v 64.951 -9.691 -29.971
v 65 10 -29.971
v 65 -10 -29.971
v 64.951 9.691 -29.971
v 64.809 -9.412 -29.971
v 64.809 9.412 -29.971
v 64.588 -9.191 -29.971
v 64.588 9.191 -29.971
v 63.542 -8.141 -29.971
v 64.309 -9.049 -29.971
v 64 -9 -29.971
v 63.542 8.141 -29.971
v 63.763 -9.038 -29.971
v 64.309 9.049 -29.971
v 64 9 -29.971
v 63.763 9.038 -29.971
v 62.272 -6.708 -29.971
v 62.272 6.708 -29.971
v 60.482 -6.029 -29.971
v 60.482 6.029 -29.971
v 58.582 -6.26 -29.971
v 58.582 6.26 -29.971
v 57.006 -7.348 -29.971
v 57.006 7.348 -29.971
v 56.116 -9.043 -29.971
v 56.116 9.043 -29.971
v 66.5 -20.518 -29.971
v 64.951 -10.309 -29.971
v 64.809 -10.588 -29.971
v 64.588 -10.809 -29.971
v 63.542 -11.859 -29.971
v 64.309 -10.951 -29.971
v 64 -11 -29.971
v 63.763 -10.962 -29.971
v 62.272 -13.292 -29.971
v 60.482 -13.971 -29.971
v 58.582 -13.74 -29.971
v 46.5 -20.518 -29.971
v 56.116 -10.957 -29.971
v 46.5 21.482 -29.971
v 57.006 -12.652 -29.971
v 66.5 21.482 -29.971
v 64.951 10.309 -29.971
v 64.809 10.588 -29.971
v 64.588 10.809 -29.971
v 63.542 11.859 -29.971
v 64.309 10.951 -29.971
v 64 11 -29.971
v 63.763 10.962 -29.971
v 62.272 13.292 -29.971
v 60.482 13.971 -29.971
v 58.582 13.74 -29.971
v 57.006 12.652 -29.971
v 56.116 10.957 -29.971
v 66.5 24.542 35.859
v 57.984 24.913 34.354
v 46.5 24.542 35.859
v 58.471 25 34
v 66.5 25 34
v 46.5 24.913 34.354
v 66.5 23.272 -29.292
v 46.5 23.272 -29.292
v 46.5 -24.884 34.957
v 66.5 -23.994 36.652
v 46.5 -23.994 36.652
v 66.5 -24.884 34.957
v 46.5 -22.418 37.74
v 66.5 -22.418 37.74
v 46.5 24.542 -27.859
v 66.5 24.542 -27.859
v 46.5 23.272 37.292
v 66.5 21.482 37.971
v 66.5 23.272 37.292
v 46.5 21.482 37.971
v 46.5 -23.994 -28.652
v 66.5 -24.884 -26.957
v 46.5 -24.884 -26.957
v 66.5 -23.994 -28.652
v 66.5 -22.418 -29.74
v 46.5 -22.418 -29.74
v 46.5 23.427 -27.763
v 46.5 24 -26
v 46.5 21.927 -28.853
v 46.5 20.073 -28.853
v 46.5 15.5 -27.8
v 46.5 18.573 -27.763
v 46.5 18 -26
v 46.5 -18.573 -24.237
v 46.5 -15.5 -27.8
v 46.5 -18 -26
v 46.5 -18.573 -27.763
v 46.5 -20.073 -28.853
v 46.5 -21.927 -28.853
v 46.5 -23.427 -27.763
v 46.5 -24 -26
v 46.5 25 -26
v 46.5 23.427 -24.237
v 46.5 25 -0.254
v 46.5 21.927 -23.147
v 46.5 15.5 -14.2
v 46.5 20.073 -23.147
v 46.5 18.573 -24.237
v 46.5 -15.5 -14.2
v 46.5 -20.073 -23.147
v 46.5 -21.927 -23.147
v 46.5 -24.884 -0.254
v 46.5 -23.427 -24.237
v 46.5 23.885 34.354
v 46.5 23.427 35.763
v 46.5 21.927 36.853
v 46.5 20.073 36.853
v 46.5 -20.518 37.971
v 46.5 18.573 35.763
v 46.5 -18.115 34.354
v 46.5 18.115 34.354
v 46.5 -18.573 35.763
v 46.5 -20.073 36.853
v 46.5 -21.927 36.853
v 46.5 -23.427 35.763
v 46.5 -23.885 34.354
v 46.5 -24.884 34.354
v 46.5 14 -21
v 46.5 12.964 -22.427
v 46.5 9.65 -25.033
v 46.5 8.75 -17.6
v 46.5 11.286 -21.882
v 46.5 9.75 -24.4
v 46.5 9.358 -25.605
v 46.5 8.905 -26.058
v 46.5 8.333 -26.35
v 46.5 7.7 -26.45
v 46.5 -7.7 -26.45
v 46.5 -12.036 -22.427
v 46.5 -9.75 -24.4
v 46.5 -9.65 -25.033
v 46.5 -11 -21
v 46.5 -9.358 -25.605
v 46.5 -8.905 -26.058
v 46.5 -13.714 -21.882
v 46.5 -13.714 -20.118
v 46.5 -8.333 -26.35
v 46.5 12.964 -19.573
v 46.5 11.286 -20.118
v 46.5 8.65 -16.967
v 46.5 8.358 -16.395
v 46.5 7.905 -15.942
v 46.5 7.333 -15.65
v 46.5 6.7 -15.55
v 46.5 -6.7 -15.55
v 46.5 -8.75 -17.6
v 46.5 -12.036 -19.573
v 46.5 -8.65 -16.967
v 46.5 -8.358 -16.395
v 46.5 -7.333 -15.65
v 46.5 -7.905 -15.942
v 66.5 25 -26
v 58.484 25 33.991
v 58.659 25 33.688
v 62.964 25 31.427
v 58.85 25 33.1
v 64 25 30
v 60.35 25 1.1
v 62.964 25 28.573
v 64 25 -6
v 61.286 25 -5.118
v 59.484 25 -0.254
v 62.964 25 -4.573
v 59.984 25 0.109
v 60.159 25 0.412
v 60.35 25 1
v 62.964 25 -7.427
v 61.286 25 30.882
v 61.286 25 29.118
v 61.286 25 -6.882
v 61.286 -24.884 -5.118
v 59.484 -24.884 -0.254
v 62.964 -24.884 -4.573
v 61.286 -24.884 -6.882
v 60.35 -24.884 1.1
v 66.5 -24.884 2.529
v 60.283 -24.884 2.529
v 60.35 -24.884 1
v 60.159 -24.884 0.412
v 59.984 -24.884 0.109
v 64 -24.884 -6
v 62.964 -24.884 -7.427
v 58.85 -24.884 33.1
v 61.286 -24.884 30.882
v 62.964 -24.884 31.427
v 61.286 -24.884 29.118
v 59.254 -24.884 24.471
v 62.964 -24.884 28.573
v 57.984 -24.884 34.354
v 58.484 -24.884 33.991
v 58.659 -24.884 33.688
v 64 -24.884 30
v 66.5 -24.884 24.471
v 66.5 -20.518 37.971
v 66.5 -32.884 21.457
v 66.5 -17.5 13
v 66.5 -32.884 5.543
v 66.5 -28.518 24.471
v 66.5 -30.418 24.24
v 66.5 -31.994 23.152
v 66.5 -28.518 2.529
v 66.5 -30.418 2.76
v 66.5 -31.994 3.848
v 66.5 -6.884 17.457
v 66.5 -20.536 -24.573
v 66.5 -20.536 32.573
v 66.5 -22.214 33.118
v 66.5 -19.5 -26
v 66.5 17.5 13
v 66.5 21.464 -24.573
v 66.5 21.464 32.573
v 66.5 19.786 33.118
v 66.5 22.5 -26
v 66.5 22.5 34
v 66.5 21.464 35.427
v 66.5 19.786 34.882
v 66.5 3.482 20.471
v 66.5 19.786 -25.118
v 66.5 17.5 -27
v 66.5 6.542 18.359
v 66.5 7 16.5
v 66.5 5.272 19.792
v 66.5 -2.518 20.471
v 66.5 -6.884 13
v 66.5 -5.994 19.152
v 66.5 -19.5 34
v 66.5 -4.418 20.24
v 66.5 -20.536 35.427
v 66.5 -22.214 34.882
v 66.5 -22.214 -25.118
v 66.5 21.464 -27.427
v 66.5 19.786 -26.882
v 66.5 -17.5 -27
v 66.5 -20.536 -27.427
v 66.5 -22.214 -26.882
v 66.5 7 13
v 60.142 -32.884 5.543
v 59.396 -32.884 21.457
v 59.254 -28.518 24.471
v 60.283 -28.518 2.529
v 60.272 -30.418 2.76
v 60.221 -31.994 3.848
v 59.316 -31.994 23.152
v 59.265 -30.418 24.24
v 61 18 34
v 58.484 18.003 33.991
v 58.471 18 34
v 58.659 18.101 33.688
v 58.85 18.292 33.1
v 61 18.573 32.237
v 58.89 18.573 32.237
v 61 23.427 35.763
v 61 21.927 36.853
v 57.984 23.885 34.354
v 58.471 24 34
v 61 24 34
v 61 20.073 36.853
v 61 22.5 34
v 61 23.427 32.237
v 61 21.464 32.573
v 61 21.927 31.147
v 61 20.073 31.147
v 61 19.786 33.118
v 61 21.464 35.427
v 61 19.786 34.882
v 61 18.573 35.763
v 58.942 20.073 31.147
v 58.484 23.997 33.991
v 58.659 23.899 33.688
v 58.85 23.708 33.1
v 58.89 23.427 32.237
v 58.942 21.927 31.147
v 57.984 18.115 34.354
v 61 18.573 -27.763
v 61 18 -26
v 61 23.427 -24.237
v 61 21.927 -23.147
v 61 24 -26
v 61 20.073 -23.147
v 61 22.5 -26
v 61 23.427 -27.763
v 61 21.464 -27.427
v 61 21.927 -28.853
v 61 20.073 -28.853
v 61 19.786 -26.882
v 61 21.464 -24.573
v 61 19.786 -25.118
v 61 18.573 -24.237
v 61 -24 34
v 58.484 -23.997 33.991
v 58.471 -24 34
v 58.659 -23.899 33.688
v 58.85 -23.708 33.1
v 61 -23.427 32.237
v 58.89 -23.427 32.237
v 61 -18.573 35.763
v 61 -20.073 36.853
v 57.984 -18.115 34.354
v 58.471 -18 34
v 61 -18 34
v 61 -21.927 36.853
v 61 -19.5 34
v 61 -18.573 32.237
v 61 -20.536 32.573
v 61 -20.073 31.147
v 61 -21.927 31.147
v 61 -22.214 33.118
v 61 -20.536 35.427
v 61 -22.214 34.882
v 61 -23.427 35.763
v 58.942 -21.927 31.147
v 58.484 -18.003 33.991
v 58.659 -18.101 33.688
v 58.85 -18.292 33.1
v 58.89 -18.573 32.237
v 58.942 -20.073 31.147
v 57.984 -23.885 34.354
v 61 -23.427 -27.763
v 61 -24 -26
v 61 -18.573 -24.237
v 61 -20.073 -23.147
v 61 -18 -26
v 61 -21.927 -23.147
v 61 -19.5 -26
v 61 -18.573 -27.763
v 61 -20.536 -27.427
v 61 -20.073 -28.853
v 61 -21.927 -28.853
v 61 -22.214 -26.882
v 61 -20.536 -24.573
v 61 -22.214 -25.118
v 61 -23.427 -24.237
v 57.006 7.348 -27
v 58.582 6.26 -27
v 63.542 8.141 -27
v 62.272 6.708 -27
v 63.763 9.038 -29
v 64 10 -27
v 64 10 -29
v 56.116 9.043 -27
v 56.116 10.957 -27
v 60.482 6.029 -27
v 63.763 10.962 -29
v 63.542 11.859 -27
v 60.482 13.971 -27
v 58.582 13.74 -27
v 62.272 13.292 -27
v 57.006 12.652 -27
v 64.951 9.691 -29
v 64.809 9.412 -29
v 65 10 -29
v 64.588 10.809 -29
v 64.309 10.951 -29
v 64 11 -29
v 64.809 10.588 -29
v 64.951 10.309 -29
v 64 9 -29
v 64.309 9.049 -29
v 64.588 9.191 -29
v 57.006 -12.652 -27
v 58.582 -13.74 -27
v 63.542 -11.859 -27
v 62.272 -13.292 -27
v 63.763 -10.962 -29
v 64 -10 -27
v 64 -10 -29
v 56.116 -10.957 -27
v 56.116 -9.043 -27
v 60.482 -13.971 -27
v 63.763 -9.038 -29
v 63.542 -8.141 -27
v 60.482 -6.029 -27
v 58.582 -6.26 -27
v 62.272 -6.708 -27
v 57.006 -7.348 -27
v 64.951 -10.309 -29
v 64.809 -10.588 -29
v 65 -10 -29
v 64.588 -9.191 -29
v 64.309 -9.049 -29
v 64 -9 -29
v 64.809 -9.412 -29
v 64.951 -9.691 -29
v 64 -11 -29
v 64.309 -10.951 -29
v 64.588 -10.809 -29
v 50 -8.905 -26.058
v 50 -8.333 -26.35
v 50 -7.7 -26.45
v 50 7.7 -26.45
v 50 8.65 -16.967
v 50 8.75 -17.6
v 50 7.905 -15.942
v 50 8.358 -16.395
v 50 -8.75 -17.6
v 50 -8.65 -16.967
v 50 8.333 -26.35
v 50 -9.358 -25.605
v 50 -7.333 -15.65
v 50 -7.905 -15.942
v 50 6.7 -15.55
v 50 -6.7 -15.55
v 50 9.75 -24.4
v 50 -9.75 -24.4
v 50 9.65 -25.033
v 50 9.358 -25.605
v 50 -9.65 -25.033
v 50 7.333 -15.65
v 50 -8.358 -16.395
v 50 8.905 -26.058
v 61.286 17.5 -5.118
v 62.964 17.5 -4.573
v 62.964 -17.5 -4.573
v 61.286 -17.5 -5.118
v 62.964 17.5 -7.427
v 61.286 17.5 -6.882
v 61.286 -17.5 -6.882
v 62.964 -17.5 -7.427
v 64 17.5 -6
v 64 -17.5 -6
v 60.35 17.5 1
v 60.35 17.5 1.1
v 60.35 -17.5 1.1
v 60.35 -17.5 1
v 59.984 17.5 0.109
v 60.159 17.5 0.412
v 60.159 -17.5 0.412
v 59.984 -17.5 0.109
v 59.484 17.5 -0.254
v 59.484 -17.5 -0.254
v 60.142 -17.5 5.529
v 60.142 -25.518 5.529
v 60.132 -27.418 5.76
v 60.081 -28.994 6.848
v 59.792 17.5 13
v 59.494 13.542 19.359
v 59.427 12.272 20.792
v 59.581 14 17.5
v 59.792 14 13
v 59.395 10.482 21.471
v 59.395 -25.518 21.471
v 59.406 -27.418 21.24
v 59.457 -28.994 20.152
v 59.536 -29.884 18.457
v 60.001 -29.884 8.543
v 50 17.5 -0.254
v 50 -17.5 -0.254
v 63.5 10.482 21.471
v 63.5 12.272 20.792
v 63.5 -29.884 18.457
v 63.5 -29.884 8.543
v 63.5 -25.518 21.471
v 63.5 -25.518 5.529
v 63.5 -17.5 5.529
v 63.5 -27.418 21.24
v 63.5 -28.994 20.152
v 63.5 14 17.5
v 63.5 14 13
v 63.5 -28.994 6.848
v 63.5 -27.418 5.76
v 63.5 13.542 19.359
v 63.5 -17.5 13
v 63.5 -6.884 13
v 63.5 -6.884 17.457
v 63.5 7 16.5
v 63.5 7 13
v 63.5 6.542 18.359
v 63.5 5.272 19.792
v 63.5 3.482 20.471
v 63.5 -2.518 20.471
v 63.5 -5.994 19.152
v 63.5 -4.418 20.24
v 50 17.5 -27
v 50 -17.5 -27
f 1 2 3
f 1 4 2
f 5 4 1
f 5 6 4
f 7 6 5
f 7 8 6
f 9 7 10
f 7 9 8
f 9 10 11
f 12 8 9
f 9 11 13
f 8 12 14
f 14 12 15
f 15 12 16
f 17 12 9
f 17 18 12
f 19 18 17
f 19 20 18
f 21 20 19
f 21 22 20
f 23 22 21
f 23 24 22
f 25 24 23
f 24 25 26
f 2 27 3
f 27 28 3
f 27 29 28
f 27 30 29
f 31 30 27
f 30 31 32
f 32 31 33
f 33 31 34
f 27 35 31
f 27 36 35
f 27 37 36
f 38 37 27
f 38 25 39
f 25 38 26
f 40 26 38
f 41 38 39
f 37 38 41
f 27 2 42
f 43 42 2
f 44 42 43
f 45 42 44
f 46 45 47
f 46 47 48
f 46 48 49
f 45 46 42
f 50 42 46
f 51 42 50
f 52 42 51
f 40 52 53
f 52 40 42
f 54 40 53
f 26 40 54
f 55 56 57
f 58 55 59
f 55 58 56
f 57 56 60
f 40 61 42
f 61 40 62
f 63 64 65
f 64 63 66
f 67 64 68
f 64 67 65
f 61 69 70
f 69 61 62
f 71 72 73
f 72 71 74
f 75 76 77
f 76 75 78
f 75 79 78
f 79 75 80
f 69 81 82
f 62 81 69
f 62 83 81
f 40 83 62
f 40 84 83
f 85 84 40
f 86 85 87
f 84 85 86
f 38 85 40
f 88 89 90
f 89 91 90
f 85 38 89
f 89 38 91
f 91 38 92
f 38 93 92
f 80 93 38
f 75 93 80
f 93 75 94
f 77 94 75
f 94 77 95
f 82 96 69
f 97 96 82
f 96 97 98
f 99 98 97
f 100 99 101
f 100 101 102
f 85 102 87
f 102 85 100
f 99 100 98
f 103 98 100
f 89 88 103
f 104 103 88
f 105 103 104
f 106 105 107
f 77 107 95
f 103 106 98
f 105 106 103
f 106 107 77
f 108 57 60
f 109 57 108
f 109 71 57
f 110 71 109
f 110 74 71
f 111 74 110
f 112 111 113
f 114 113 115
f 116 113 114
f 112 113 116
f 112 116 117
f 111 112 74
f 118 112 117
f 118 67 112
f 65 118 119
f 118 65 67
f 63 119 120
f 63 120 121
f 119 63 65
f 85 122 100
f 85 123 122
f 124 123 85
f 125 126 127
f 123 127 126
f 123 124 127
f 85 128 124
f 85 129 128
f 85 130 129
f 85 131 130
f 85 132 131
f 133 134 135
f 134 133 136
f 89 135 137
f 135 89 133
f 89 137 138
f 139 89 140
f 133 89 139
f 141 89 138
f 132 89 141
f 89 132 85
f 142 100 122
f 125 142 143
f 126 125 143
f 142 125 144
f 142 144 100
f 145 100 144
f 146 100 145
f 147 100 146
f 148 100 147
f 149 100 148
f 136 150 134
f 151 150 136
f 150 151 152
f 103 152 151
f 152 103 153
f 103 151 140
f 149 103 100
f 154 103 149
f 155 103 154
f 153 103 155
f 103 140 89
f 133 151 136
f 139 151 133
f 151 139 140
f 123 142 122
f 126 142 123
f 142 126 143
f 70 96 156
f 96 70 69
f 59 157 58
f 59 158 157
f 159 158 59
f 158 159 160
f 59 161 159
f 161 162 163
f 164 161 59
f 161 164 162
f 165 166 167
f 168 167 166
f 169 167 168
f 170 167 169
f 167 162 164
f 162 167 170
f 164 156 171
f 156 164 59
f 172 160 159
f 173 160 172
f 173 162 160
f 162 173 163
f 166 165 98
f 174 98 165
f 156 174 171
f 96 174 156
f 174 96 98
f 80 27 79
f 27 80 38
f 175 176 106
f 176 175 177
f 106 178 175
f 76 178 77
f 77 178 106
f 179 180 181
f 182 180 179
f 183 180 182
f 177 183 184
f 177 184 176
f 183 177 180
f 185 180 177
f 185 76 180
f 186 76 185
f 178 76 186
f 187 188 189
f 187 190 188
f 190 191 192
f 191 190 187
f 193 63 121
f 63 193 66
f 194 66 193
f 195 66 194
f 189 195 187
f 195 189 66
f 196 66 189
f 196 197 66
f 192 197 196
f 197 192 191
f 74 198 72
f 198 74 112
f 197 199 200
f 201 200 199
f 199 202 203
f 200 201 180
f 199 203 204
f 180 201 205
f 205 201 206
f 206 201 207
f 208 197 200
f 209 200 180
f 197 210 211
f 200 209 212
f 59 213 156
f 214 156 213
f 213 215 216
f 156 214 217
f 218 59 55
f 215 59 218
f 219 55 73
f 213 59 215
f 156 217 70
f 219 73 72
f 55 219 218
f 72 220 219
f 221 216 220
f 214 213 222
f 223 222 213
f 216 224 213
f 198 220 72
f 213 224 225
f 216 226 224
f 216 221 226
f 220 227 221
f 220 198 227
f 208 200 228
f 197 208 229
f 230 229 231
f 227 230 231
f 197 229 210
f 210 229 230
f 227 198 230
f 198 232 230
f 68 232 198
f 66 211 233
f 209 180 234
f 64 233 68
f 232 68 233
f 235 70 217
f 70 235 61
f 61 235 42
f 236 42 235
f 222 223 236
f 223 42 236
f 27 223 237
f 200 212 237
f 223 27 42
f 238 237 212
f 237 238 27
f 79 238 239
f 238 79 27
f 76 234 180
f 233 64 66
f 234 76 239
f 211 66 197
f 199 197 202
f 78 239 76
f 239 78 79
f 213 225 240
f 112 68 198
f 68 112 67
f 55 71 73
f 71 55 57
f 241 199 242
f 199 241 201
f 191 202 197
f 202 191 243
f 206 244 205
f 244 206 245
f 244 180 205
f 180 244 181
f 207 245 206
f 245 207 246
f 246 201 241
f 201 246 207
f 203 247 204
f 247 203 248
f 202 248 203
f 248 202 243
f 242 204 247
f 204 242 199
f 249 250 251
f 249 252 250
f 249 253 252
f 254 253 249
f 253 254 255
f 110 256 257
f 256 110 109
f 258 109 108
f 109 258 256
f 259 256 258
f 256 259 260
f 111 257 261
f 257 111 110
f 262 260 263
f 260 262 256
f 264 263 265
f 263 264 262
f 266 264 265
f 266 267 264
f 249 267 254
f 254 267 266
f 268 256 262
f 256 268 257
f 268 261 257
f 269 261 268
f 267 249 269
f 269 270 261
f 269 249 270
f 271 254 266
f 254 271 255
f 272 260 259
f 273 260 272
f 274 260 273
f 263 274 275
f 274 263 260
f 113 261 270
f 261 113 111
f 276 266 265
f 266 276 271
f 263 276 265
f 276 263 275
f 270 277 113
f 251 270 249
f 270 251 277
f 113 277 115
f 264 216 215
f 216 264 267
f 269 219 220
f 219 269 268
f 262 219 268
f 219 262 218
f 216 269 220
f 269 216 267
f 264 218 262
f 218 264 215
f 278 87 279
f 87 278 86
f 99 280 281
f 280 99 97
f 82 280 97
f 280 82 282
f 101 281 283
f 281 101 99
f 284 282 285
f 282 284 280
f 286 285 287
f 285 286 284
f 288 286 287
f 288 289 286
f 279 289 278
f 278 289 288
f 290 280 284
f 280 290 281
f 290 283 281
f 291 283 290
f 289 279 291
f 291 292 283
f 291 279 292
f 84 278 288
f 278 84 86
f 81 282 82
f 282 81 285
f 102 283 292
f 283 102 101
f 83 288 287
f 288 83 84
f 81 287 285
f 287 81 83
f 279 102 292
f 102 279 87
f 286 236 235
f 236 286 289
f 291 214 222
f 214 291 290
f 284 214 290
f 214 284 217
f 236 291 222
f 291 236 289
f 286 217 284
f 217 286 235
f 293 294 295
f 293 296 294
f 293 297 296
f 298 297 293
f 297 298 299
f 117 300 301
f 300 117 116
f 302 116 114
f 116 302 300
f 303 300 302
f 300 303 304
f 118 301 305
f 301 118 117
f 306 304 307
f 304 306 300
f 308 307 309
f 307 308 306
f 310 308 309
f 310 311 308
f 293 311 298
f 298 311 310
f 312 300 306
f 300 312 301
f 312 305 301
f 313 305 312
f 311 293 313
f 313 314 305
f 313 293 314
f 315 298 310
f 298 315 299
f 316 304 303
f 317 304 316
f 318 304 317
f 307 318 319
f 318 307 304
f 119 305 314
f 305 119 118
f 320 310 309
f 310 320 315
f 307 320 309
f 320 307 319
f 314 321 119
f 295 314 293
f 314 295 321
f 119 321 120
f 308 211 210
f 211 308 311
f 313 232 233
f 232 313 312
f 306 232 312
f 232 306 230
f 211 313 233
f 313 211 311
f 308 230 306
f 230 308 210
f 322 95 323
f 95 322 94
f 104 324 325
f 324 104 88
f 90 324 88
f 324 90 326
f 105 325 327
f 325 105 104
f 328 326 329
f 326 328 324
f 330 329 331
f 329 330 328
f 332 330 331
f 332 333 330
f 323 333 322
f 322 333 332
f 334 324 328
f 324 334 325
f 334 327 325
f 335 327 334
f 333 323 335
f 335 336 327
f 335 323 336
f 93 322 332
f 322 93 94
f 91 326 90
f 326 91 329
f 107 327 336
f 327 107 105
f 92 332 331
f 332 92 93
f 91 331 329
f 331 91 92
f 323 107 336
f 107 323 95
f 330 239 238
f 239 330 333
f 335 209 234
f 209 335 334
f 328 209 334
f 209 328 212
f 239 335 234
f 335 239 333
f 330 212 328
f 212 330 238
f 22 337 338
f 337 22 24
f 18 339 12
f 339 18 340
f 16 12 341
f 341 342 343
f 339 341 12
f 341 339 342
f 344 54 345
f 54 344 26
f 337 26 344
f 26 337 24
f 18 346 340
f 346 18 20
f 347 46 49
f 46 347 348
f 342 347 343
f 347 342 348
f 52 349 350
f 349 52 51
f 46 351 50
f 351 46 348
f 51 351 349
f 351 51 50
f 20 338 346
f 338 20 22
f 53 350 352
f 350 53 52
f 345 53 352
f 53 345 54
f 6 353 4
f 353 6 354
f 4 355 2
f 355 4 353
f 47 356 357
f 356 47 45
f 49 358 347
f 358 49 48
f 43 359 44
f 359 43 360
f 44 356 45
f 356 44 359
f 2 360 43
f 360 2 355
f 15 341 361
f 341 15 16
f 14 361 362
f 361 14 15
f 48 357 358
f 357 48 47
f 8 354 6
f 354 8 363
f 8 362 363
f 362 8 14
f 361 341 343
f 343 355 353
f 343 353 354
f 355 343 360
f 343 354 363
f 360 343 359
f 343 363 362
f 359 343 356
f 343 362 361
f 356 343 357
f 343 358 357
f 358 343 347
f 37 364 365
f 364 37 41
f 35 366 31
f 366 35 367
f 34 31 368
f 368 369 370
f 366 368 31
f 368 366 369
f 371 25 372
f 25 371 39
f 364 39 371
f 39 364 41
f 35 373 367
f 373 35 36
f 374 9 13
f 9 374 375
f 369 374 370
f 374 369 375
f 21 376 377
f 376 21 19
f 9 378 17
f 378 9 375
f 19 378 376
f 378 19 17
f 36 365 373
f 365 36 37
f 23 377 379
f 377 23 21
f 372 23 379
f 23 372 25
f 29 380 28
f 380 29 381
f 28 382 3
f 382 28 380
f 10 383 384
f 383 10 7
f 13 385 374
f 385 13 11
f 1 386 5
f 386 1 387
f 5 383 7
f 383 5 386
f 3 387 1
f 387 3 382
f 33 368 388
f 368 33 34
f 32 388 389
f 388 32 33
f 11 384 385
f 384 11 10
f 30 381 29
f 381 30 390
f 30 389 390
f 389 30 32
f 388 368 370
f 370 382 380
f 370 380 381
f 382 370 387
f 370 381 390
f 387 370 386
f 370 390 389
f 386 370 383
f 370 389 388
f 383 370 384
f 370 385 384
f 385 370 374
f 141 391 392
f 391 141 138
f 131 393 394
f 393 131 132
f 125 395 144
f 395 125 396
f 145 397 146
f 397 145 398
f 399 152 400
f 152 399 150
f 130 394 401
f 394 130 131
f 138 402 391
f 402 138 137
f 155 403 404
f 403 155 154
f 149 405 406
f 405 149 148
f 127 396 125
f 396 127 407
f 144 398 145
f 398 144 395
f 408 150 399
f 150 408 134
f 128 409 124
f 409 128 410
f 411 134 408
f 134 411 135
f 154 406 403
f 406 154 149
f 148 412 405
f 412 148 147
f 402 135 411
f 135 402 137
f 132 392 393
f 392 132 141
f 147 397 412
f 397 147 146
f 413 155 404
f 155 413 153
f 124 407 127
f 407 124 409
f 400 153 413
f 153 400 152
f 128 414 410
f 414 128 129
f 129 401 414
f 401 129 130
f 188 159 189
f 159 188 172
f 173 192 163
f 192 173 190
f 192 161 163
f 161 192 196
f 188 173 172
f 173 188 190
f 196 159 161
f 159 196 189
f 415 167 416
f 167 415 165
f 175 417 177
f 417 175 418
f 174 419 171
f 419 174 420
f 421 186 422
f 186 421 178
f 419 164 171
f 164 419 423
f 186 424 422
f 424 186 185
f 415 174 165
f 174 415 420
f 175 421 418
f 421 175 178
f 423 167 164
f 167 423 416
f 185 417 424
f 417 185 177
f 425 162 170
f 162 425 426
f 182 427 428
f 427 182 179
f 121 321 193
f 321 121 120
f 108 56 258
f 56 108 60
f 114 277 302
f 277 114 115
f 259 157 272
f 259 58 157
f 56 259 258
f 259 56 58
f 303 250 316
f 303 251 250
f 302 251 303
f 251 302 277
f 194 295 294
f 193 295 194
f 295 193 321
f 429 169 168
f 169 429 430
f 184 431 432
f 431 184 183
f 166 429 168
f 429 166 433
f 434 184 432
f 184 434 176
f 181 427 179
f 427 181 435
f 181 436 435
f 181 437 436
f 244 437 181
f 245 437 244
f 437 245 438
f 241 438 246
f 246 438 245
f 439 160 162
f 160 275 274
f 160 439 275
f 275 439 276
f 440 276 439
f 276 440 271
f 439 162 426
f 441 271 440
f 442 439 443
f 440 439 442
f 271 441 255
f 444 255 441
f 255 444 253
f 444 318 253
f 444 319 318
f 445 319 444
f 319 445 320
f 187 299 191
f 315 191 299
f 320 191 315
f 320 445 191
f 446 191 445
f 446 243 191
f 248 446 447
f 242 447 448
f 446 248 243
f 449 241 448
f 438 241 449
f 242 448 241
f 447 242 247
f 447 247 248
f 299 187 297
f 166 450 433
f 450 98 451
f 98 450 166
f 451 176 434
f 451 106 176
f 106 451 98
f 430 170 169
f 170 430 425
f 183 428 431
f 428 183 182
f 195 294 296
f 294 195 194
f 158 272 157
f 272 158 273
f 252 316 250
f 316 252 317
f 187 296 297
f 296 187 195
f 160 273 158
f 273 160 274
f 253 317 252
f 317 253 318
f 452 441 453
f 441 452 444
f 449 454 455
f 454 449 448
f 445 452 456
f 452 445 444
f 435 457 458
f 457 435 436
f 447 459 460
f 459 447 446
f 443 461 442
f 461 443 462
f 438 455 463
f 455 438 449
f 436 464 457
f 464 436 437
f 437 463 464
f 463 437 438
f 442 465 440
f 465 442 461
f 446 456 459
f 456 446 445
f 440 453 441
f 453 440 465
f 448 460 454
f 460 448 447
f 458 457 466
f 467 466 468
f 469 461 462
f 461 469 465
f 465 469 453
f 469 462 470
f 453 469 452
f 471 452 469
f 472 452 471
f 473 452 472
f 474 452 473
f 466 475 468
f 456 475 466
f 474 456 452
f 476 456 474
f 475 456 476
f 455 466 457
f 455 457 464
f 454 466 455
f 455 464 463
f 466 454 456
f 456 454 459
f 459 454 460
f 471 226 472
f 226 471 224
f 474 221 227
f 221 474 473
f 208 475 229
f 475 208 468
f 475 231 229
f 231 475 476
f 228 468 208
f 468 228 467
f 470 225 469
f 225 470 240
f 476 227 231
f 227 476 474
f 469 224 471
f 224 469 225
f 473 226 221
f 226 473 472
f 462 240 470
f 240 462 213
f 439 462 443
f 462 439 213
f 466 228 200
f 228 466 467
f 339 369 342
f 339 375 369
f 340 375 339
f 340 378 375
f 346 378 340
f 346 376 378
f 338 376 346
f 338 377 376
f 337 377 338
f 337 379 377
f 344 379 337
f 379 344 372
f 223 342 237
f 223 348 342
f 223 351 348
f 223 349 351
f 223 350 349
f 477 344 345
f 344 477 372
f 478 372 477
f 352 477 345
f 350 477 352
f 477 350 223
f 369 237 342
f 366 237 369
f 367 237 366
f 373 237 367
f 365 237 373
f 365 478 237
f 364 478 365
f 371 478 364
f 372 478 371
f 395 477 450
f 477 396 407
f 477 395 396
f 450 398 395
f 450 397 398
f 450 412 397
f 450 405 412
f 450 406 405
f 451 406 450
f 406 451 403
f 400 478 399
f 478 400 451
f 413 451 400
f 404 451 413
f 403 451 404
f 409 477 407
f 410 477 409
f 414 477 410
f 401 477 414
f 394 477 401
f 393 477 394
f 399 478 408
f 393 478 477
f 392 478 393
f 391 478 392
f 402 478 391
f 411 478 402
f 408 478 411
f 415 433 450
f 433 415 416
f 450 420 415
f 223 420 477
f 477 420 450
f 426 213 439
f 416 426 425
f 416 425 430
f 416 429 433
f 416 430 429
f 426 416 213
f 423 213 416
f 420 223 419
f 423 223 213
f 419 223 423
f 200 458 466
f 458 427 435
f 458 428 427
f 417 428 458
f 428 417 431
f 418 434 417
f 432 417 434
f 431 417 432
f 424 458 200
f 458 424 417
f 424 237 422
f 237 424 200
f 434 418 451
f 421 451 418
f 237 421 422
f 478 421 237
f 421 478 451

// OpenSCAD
// file: sp6t.scad
use <util.scad>

module placeSp6tHolePattern(l=10){
translate([0,0,42.5+5-l])quad(35/2) children();
}

module sp6tHolePattern(l=10){
//translate([0,0,42.5+5-l])quad(35/2) cylinder(l, 3/2, 3/2);
    placeSp6tHolePattern() cylinder(l, 3/2, 3/2);
}

module sp6t(){
    cylinder(42.5, 20, 20);
    translate([0,0,-9])
    cylinder(9, 11.1, 11.1);
    translate([0,0,42.5]){
        difference(){
        centerCube([45, 45,3]);
       translate([0,0,-42.5+5])sp6tHolePattern();
        }
        translate([0,0,3]){
            color([0,1,0])nObj(13, 6, 0) cylinder(8, 6.5/2, 6.5/2);
            cylinder(8, 6.5/2, 6.5/2);
        }
    }
}

sp6t();
// file: util.scad
module centerCube(v){
    translate([-v[0]/2,-v[1]/2,0]) cube(v);
}

module nObj(r, n, offs){
    for(a=[1:n]) rotate([0,0, offs+a*360/n]) translate([r,0,0]) children();
}

module quad(d){
    nObj(sqrt(2)*d, 4, 45) children();
}

module quad2(x,y){
    translate([x,y,0]) children();
    translate([x,-y,0]) children();
    translate([-x,y,0]) children();
    translate([-x,-y,0]) children();
}

module zt(z){
    translate([0,0,z]) children();
}

module xt(x){
    translate([x,0,0]) children();
}

module yt(y){
    translate([0,y,0]) children();
}

module zr(z){
    rotate([0,0,z]) children();
}

module xr(x){
    rotate([x,0,0]) children();
}

module yr(y){
    rotate([0,y,0]) children();
}
// file: preselectorAssemblyYig.scad
//Distance from top of bottom encolosure to top of PCB 23mm

module cCube(v){
    d=-[v[0], v[1],0]/2;
    translate(d) cube(v);
}

module quadPlace(x,y){
    translate([x,y,0]) children();
    translate([x,-y,0]) children();
    translate([-x,y,0]) children();
    translate([-x,-y,0]) children();
}

module placeAlignmentScrews(){
    rotate([0,0,180])children();
    translate([0,70.739, 0]) children();
}

module placeDriverScrews(){
    translate([2.54+6.858,70.739+4.191,  0]) for(i=[0:7]) translate([i*10.795,0,0])children();
}

module placeRegulatorScrews(){
    translate([ 45.72,-4.572, 0 ]) for(i=[0:3]) translate([i*13.716,0,0])children();
}

module centerInBox(){
    translate([-96.139/2,-70.739/2, 0]) children();
}


module placeTo220Screws(){
    centerInBox() translate([0, 0, 17]){
        placeDriverScrews() rotate([-90,0,0]) children();
        placeRegulatorScrews() rotate([90,0,0]) children();
    }
}

module frame(){
    translate([0,0,17-4])
    difference(){
        cCube([115,89, 8]+[10,10,0]);
        cCube([115,89, 8]);
    }
}


module placePcbScrews(){
    centerInBox() placeAlignmentScrews()  children();
    mirror([1,0,0])centerInBox() placeAlignmentScrews() children();
}

module frameBody(){
    frame();
    intersection(){
        placePcbScrews() hull() {
            cylinder(21, 4, 4);
            translate([0, 20, 0])cylinder(21, 4, 4);
        }
        cCube([115,89, 21]+[10,10,0]);
    }
    placeTo220Screws() cylinder(15,4,4);
}

module pcbYig(){
    difference(){
        frameBody();
        placePcbScrews() cylinder(21,1.5,1.5);
        placeTo220Screws() cylinder(20,1.5,1.5);
        cCube([86,89, 30]);
    }
}

module boxYigBody(){
    difference(){
        cCube([120+6, 94+6,23+3]);
        cCube([120, 94,23+3]-[20, 20,-10]);
        cCube([120, 94,23]);
        
        
    }
    difference(){
        placeTo220Screws() cylinder(15,4,4);
        cCube([120, 94,23]);
        
    }
}

module boxYig(){
    difference(){
        boxYigBody();
        quadPlace(110/2,84/2) cylinder(30, 2, 2);
        placeTo220Screws() cylinder(15,1.5,1.5);
    }
}

difference(){
boxYig();
    cCube([200,200,13]);
}
//pcbYig();
// file: ventilatedLid.scad
module quad(x, y){
    translate([x, y , 0]) children();
    translate([x, -y , 0]) children();
    translate([-x, y , 0]) children();
    translate([-x, -y , 0]) children();
}

module roundedCorners(v, r){
    x = v[0];
    y = v[1];
    z = v[2];
    x2=x/2-r;
    y2=y/2-r;
    hull() quad(x2, y2) cylinder(z, r, r);
}


module lid(){
    difference(){
        roundedCorners([120,94,4], 3, $fn=20);
        quad(109.5/2,84/2) cylinder(10,2,2);
        translate([0, 0, 2])quad(109.5/2,84/2) cylinder(3,2,5);
    }
}

module fanHolePattern(r=1.5, l=10){
    cylinder(l, 38/2, 38/2);
    quad(32/2, 32/2) cylinder(l,r,r);
}


module centerHexGrid(r, s, nx, ny){
        f=cos(360/(6*2));
        sx=(2*r+s)*f;
        sy=sx*cos(30);
        if(ny == 1) translate(-[sx*(nx-1), sy*(ny-1), 0]/2) children();
        else translate(-[sx*(nx-0.5), sy*(ny-1), 0]/2) children();
}

module hexGrid(l, r, s, nx, ny){
    f=cos(360/(6*2));
    sx=(2*r+s)*f;
    sy=sx*cos(30);
    for(j=[0:ny-1]){
        for(i=[0:nx-1]){
            offset=(j%2)*sx/2;
            %translate([sx*i, 0, 0]) rotate([0,0, 90]) cylinder(l, r, r, $fn=6);
            translate([sx*i+offset, sy*j, 0]) rotate([0,0, 90]) cylinder(l, r, r, $fn=6);
        }
    }
}

module circleGrid(l, r, s, nx, ny, cr){
    f=cos(360/(6*2));
    sx=(2*r+s)*f;
    sy=sx*cos(30);
    for(j=[0:ny-1]){
        for(i=[0:nx-1]){
            offset=(j%2)*sx/2;
            %translate([sx*i, 0, 0]) rotate([0,0, 90]) cylinder(l, cr, cr, $fn=6*3);
            translate([sx*i+offset, sy*j, 0]) rotate([0,0, 90]) cylinder(l, cr, cr, $fn=6*3);
        }
    }
}

module fanInletHoles(l=10){
    x=9;
    y=11;
    intersection(){
        centerHexGrid(2, 1.2, x, y) hexGrid(l, 2, 1.2, x, y);
        cylinder(l, 38/2, 38/2);
    }
}

module fanInletHolesCircle(l=10, cr){
    x=9;
    y=11;
    intersection(){
        centerHexGrid(2, 1.2, x, y) circleGrid(l, 2, 1.2, x, y, cr);
        cylinder(l, 38/2, 38/2);
    }
}


//fanHolePattern();
module lidVentilatedHex(){
    difference(){
        lid();
        translate([0,0,2])fanHolePattern();
        fanInletHoles();
        quad(32/2, 32/2) cylinder(10,1.5,1.5);
        translate([0,37,0])centerHexGrid(3, 1.2, 15, 2) hexGrid(10, 3, 1.2, 15,2);
        translate([20,-37,0])centerHexGrid(3, 1.2, 6, 2) hexGrid(10, 3, 1.2, 6,2);
    }
}

module lidDrillTemplateCenter(){
        difference(){
        lid();
        translate([0,0,2])fanHolePattern();
        fanInletHolesCircle(10, 1);
        quad(32/2, 32/2) cylinder(10,1.5,1.5);
        translate([0,37,0])centerHexGrid(3, 1.2, 15, 2) circleGrid(10, 3, 1.2, 15,2, 1);
        translate([20,-37,0])centerHexGrid(3, 1.2, 6, 2) circleGrid(10, 3, 1.2, 6,2, 1);
    }
}

module lidDrillTemplateLarge(){
        difference(){
        lid();
        //translate([0,0,2])fanHolePattern();
        fanInletHolesCircle(10, 1.75);
        quad(32/2, 32/2) cylinder(10,1.5,1.5);
        translate([0,37,0])centerHexGrid(3, 1.2, 15, 2) circleGrid(10, 3, 1.2, 15,2, 2.5);
        translate([20,-37,0])centerHexGrid(3, 1.2, 6, 2) circleGrid(10, 3, 1.2, 6,2, 2.5);
    }
}

module fanSpacer(){
difference(){
roundedCorners([40,40,3], 3, $fn=20);
    fanHolePattern();
}
}

module fanGrill(){
difference(){
    roundedCorners([40,40,4], 3, $fn=20);
    fanInletHoles(10);//, 1.75);
    quad(32/2, 32/2) cylinder(10,1.5,1.5);
    translate([0,0,2])fanHolePattern();
}
}
//fanGrill();
lidVentilatedHex();
//lidDrillTemplateCenter();
//lidDrillTemplateLarge();
// main file
use <preselectorAssembly.scad>
use <ventilatedLid.scad>
use <preselectorAssemblyYig.scad>

module x(d){
    translate([d,0,0]) children();
}

module z(d){
    translate([0,0,d]) children();
}

module cCube(v){
    x=v[0]/2;
    y=v[1]/2;
    translate(-[x,y,0])cube(v);
}

module smaConnector(){
    intersection(){
        cCube([13,13,2]);
        cylinder(2, 8, 8);
    }
    cylinder(10,3.1,3.1);
    for(i=[0:3]){
            rotate([0,0,45+i*90]) translate([11.3/2,0,0]) cylinder(4,2,2);
    }
}

module yigFilterMainBody(){
    translate([0,0,-17/2]){
        intersection(){
            cylinder(17,30,30);
            cCube([50,50,17]);
        }

        translate([0,0,17]) cylinder(17,22,22);
        translate([0,0,-17]) cylinder(17,22,22);
        for(i=[0:3]){
            rotate([0,0,45+i*90])translate([27,0,-3])cylinder(23,2.8,2.8);
        }
    }
    translate([-15,22-6,-15])cube([30, 13+6,30]);
    
}

module yigFilterBody(){
    translate([25,0,0])rotate([0,90,0])smaConnector();
    translate([-25,0,0])rotate([0,-90,0])smaConnector();
    yigFilterMainBody();
}

module yigFilter(){
    difference(){
        yigFilterBody();
        
yigFilterHolePattern() cylinder(5,1.5, 1.5);
    }
}

module yigFilterHolePattern(){
    translate([12.5, -25,0])rotate([-90,0,0]) children();
    translate([-12.5, -25,0])rotate([-90,0,0]) children();
}

module yigFilterMountVolume(){
    minkowski(){
        yigFilter();
        rotate([-90,0,0]) cylinder(100, 0.25, 0.25);
    }

}

module holderMountHolePattern(){
    translate([21,40,30]) rotate([90,0,0]) children();
    translate([21,40,-30]) rotate([90,0,0]) children();
    translate([-21,40,30]) rotate([90,0,0]) children();
    translate([-21,40,-30]) rotate([90,0,0]) children();
}

module yigFilterHolder(){
    difference(){
        translate([0,5,-35])cCube([50, 65,70]);
        translate([0,-10,0])yigFilterHolePattern() cylinder(15,1.5, 1.5);
        yigFilterMountVolume();
        holderMountHolePattern()cylinder(20, 1.5,1.5);
    }
}

module drillPattern(){
    difference(){
        hull() holderMountHolePattern() cylinder(2,4,4);
        holderMountHolePattern() cylinder(2,1.5,1.5, $fn=20);
    }
}

module placeYigFilter(){
    translate([104,0,4])rotate([0,0,90]) children();
}


module yigMountPlateBody(){
    eh=12;
    hull() translate([-3.5-2,0,0]) placeYigFilter() holderMountHolePattern() z(-eh)cylinder(8+eh, 4, 4);
    hull() translate([-3.5-2,0,0]) placeYigFilter() translate([-5-3,40,9.5]) rotate([90,0,0]) quad(21, 7) cylinder(8, 4, 4);
}

module yigMountPlate(){
    difference(){
        yigMountPlateBody();
        translate([-3.0,0,0]) placeYigFilter() holderMountHolePattern() m3Screw(eh=30);
        minkowski(){
            enclosure();
            
            sphere(0.35);
        }
        placeBananas() banana();
            placeDSub() dSub();
        placeBottomBracketScrews() m3Screw(l=30);
        placeTopBracketScrews() m3Screw(l=30);
        hull() translate([-3.5-2,0,0]) placeYigFilter() translate([-5-3,40,9.5]) rotate([90,0,0]) quad(21-3, 7-3) cylinder(5, 4, 4);
        hull() translate([-3.5-2,0,0]) placeYigFilter() translate([0,40,9.5]) rotate([90,0,0]) quad(3, 3) cylinder(10, 4, 4);
        translate([60,0,-27])cCube([20, 35, 40]);
    }
    
}

module placePcbThroughScrews(){
    placePcbScrews() translate([0,0,37]) rotate([180,0,0]) children();
}

module placeBottomBracketScrews(){
    
    translate([62.5,-28,30]) rotate([-90,0,0]) children();
    translate([62.5,28,30]) rotate([90,0,0]) children();
}

module placeTopBracketScrews(){
    translate([62.5,-28,-6])rotate([-90,0,0])children();
    translate([62.5,28,-6])rotate([90,0,0])children();
}

module topBracketBody(){
    hull(){
        translate([0, 0, -3])fanSpacer();
        placeTopBracketScrews()m3ScrewFastenVolume();
    }
}

module fanBody(){
    hull() quad(32/2, 32/2) cylinder(21,5,5);
}

module fan(){
    difference(){
        fanBody();
        fanHolePattern(l=40);
    }
}

module placeFan(){
    translate([0,0,-21-3]) children();
}

module topBracket(){
    difference(){
        topBracketBody();
        placeTopBracketScrews()m3Screw(eh=10);
        translate([0,0,-8])fanHolePattern();
                minkowski(){
            union(){
                enclosure();
                yigMountPlateBody();
                placeFan() fanBody();
                hull() placeYigFilter() yigFilterHolder();
            }
            sphere(0.3);
        }
        
    hull() translate([40,0,-20])quad(10, 20) cylinder(30, 2, 2);    
        
    }
    
    
}
module placeAllBottomBracketScrews(){
    placePcbThroughScrews() children();
    placeBottomBracketScrews() children();
}

module bottomBracketBody(){
    hull() placeAllBottomBracketScrews() m3ScrewFastenVolume();
}

module bottomBracket(){
    difference(){
        bottomBracketBody();
        placeAllBottomBracketScrews() m3Screw(eh=10);
        minkowski(){
            union(){
                enclosure();
                yigMountPlateBody();
                hull() placeYigFilter() yigFilterHolder();
            }
            
            sphere(0.3);
        }
        hull() translate([0,0,30]) quad(40, 30) cylinder(30, 3, 3); z(d){
    translate([0,0,d]) children();
}
    }
    
}

module assembly(){
    placeYigFilter(){
        yigFilterHolder();
        yigFilter();
    }

    placePcbThroughScrews() m3Screw();
    placeBottomBracketScrews() m3Screw();
    
    placeYigFilter() holderMountHolePattern() cylinder(3, 1.5, 1.5);
    translate([-3.5,0,0]) placeYigFilter() holderMountHolePattern() cylinder(3, 3, 3);

    //lidVentilatedHex();    
    enclosure();
    
    yigMountPlate();
    placeFan() fan();
    
    bottomBracket();
    topBracket();
    
    //placeBananas() banana();
    //placeDSub() dSub();
}


module m3ScrewFastenVolume(){
    translate([0,0,-2]) cylinder(5, 6,6);
}

module m3Screw(l=10, eh=0){
    translate([0,0,-2]){
        translate([0,0,-eh])cylinder(2+eh, 3,3);
        cylinder(3+l,1.5,1.5);
    }

}

module banana(){
    cylinder(4,6,6);
    z(-22)cylinder(22, 4,4);
    x(4)z(-1) cylinder(1,1,1, $fn=20);
}


module placeDsubHolePattern(){
    x(-12.5) children();
    x(12.5) children();
}

module dSubBody(){
    r=1.8;
    l1=19/2-r;
    l2=17/2-r;
    w=10.4/2-r;
    h=12;
    c=0.25;
    hull(){
        translate([l1,w, 0]) cylinder(h,r+c,r+c, $fn=20);
        translate([-l1,w, 0]) cylinder(h,r+c,r+c, $fn=20);
        translate([l2,-w, 0]) cylinder(h,r+c,r+c, $fn=20);
        translate([-l2,-w, 0]) cylinder(h,r+c,r+c, $fn=20);
    }
    z(5) cCube([31, 13.6, 1]);
}

module dSub(){
    difference(){
        dSubBody();
        placeDsubHolePattern() cylinder(10, 1.5, 1.5);
    }
}

module placeBananas(){
    translate([60, 10, -30])rotate([180,0,0]) children();
    translate([60, -10, -30])rotate([180,0,0]) children();
}

module placeDSub(){
    translate([51.5,0,-21]) rotate([0,-90,0])rotate([0,0,90])children();
}


//translate([60, 10, -30])rotate([180,0,0]) banana();
//translate([60, -10, -30])rotate([180,0,0]) banana();
//translate([51.5,0,-21]) rotate([0,-90,0])rotate([0,0,90])dSub();
//assembly();
//bottomBracket();
//topBracket();
yigMountPlate();
